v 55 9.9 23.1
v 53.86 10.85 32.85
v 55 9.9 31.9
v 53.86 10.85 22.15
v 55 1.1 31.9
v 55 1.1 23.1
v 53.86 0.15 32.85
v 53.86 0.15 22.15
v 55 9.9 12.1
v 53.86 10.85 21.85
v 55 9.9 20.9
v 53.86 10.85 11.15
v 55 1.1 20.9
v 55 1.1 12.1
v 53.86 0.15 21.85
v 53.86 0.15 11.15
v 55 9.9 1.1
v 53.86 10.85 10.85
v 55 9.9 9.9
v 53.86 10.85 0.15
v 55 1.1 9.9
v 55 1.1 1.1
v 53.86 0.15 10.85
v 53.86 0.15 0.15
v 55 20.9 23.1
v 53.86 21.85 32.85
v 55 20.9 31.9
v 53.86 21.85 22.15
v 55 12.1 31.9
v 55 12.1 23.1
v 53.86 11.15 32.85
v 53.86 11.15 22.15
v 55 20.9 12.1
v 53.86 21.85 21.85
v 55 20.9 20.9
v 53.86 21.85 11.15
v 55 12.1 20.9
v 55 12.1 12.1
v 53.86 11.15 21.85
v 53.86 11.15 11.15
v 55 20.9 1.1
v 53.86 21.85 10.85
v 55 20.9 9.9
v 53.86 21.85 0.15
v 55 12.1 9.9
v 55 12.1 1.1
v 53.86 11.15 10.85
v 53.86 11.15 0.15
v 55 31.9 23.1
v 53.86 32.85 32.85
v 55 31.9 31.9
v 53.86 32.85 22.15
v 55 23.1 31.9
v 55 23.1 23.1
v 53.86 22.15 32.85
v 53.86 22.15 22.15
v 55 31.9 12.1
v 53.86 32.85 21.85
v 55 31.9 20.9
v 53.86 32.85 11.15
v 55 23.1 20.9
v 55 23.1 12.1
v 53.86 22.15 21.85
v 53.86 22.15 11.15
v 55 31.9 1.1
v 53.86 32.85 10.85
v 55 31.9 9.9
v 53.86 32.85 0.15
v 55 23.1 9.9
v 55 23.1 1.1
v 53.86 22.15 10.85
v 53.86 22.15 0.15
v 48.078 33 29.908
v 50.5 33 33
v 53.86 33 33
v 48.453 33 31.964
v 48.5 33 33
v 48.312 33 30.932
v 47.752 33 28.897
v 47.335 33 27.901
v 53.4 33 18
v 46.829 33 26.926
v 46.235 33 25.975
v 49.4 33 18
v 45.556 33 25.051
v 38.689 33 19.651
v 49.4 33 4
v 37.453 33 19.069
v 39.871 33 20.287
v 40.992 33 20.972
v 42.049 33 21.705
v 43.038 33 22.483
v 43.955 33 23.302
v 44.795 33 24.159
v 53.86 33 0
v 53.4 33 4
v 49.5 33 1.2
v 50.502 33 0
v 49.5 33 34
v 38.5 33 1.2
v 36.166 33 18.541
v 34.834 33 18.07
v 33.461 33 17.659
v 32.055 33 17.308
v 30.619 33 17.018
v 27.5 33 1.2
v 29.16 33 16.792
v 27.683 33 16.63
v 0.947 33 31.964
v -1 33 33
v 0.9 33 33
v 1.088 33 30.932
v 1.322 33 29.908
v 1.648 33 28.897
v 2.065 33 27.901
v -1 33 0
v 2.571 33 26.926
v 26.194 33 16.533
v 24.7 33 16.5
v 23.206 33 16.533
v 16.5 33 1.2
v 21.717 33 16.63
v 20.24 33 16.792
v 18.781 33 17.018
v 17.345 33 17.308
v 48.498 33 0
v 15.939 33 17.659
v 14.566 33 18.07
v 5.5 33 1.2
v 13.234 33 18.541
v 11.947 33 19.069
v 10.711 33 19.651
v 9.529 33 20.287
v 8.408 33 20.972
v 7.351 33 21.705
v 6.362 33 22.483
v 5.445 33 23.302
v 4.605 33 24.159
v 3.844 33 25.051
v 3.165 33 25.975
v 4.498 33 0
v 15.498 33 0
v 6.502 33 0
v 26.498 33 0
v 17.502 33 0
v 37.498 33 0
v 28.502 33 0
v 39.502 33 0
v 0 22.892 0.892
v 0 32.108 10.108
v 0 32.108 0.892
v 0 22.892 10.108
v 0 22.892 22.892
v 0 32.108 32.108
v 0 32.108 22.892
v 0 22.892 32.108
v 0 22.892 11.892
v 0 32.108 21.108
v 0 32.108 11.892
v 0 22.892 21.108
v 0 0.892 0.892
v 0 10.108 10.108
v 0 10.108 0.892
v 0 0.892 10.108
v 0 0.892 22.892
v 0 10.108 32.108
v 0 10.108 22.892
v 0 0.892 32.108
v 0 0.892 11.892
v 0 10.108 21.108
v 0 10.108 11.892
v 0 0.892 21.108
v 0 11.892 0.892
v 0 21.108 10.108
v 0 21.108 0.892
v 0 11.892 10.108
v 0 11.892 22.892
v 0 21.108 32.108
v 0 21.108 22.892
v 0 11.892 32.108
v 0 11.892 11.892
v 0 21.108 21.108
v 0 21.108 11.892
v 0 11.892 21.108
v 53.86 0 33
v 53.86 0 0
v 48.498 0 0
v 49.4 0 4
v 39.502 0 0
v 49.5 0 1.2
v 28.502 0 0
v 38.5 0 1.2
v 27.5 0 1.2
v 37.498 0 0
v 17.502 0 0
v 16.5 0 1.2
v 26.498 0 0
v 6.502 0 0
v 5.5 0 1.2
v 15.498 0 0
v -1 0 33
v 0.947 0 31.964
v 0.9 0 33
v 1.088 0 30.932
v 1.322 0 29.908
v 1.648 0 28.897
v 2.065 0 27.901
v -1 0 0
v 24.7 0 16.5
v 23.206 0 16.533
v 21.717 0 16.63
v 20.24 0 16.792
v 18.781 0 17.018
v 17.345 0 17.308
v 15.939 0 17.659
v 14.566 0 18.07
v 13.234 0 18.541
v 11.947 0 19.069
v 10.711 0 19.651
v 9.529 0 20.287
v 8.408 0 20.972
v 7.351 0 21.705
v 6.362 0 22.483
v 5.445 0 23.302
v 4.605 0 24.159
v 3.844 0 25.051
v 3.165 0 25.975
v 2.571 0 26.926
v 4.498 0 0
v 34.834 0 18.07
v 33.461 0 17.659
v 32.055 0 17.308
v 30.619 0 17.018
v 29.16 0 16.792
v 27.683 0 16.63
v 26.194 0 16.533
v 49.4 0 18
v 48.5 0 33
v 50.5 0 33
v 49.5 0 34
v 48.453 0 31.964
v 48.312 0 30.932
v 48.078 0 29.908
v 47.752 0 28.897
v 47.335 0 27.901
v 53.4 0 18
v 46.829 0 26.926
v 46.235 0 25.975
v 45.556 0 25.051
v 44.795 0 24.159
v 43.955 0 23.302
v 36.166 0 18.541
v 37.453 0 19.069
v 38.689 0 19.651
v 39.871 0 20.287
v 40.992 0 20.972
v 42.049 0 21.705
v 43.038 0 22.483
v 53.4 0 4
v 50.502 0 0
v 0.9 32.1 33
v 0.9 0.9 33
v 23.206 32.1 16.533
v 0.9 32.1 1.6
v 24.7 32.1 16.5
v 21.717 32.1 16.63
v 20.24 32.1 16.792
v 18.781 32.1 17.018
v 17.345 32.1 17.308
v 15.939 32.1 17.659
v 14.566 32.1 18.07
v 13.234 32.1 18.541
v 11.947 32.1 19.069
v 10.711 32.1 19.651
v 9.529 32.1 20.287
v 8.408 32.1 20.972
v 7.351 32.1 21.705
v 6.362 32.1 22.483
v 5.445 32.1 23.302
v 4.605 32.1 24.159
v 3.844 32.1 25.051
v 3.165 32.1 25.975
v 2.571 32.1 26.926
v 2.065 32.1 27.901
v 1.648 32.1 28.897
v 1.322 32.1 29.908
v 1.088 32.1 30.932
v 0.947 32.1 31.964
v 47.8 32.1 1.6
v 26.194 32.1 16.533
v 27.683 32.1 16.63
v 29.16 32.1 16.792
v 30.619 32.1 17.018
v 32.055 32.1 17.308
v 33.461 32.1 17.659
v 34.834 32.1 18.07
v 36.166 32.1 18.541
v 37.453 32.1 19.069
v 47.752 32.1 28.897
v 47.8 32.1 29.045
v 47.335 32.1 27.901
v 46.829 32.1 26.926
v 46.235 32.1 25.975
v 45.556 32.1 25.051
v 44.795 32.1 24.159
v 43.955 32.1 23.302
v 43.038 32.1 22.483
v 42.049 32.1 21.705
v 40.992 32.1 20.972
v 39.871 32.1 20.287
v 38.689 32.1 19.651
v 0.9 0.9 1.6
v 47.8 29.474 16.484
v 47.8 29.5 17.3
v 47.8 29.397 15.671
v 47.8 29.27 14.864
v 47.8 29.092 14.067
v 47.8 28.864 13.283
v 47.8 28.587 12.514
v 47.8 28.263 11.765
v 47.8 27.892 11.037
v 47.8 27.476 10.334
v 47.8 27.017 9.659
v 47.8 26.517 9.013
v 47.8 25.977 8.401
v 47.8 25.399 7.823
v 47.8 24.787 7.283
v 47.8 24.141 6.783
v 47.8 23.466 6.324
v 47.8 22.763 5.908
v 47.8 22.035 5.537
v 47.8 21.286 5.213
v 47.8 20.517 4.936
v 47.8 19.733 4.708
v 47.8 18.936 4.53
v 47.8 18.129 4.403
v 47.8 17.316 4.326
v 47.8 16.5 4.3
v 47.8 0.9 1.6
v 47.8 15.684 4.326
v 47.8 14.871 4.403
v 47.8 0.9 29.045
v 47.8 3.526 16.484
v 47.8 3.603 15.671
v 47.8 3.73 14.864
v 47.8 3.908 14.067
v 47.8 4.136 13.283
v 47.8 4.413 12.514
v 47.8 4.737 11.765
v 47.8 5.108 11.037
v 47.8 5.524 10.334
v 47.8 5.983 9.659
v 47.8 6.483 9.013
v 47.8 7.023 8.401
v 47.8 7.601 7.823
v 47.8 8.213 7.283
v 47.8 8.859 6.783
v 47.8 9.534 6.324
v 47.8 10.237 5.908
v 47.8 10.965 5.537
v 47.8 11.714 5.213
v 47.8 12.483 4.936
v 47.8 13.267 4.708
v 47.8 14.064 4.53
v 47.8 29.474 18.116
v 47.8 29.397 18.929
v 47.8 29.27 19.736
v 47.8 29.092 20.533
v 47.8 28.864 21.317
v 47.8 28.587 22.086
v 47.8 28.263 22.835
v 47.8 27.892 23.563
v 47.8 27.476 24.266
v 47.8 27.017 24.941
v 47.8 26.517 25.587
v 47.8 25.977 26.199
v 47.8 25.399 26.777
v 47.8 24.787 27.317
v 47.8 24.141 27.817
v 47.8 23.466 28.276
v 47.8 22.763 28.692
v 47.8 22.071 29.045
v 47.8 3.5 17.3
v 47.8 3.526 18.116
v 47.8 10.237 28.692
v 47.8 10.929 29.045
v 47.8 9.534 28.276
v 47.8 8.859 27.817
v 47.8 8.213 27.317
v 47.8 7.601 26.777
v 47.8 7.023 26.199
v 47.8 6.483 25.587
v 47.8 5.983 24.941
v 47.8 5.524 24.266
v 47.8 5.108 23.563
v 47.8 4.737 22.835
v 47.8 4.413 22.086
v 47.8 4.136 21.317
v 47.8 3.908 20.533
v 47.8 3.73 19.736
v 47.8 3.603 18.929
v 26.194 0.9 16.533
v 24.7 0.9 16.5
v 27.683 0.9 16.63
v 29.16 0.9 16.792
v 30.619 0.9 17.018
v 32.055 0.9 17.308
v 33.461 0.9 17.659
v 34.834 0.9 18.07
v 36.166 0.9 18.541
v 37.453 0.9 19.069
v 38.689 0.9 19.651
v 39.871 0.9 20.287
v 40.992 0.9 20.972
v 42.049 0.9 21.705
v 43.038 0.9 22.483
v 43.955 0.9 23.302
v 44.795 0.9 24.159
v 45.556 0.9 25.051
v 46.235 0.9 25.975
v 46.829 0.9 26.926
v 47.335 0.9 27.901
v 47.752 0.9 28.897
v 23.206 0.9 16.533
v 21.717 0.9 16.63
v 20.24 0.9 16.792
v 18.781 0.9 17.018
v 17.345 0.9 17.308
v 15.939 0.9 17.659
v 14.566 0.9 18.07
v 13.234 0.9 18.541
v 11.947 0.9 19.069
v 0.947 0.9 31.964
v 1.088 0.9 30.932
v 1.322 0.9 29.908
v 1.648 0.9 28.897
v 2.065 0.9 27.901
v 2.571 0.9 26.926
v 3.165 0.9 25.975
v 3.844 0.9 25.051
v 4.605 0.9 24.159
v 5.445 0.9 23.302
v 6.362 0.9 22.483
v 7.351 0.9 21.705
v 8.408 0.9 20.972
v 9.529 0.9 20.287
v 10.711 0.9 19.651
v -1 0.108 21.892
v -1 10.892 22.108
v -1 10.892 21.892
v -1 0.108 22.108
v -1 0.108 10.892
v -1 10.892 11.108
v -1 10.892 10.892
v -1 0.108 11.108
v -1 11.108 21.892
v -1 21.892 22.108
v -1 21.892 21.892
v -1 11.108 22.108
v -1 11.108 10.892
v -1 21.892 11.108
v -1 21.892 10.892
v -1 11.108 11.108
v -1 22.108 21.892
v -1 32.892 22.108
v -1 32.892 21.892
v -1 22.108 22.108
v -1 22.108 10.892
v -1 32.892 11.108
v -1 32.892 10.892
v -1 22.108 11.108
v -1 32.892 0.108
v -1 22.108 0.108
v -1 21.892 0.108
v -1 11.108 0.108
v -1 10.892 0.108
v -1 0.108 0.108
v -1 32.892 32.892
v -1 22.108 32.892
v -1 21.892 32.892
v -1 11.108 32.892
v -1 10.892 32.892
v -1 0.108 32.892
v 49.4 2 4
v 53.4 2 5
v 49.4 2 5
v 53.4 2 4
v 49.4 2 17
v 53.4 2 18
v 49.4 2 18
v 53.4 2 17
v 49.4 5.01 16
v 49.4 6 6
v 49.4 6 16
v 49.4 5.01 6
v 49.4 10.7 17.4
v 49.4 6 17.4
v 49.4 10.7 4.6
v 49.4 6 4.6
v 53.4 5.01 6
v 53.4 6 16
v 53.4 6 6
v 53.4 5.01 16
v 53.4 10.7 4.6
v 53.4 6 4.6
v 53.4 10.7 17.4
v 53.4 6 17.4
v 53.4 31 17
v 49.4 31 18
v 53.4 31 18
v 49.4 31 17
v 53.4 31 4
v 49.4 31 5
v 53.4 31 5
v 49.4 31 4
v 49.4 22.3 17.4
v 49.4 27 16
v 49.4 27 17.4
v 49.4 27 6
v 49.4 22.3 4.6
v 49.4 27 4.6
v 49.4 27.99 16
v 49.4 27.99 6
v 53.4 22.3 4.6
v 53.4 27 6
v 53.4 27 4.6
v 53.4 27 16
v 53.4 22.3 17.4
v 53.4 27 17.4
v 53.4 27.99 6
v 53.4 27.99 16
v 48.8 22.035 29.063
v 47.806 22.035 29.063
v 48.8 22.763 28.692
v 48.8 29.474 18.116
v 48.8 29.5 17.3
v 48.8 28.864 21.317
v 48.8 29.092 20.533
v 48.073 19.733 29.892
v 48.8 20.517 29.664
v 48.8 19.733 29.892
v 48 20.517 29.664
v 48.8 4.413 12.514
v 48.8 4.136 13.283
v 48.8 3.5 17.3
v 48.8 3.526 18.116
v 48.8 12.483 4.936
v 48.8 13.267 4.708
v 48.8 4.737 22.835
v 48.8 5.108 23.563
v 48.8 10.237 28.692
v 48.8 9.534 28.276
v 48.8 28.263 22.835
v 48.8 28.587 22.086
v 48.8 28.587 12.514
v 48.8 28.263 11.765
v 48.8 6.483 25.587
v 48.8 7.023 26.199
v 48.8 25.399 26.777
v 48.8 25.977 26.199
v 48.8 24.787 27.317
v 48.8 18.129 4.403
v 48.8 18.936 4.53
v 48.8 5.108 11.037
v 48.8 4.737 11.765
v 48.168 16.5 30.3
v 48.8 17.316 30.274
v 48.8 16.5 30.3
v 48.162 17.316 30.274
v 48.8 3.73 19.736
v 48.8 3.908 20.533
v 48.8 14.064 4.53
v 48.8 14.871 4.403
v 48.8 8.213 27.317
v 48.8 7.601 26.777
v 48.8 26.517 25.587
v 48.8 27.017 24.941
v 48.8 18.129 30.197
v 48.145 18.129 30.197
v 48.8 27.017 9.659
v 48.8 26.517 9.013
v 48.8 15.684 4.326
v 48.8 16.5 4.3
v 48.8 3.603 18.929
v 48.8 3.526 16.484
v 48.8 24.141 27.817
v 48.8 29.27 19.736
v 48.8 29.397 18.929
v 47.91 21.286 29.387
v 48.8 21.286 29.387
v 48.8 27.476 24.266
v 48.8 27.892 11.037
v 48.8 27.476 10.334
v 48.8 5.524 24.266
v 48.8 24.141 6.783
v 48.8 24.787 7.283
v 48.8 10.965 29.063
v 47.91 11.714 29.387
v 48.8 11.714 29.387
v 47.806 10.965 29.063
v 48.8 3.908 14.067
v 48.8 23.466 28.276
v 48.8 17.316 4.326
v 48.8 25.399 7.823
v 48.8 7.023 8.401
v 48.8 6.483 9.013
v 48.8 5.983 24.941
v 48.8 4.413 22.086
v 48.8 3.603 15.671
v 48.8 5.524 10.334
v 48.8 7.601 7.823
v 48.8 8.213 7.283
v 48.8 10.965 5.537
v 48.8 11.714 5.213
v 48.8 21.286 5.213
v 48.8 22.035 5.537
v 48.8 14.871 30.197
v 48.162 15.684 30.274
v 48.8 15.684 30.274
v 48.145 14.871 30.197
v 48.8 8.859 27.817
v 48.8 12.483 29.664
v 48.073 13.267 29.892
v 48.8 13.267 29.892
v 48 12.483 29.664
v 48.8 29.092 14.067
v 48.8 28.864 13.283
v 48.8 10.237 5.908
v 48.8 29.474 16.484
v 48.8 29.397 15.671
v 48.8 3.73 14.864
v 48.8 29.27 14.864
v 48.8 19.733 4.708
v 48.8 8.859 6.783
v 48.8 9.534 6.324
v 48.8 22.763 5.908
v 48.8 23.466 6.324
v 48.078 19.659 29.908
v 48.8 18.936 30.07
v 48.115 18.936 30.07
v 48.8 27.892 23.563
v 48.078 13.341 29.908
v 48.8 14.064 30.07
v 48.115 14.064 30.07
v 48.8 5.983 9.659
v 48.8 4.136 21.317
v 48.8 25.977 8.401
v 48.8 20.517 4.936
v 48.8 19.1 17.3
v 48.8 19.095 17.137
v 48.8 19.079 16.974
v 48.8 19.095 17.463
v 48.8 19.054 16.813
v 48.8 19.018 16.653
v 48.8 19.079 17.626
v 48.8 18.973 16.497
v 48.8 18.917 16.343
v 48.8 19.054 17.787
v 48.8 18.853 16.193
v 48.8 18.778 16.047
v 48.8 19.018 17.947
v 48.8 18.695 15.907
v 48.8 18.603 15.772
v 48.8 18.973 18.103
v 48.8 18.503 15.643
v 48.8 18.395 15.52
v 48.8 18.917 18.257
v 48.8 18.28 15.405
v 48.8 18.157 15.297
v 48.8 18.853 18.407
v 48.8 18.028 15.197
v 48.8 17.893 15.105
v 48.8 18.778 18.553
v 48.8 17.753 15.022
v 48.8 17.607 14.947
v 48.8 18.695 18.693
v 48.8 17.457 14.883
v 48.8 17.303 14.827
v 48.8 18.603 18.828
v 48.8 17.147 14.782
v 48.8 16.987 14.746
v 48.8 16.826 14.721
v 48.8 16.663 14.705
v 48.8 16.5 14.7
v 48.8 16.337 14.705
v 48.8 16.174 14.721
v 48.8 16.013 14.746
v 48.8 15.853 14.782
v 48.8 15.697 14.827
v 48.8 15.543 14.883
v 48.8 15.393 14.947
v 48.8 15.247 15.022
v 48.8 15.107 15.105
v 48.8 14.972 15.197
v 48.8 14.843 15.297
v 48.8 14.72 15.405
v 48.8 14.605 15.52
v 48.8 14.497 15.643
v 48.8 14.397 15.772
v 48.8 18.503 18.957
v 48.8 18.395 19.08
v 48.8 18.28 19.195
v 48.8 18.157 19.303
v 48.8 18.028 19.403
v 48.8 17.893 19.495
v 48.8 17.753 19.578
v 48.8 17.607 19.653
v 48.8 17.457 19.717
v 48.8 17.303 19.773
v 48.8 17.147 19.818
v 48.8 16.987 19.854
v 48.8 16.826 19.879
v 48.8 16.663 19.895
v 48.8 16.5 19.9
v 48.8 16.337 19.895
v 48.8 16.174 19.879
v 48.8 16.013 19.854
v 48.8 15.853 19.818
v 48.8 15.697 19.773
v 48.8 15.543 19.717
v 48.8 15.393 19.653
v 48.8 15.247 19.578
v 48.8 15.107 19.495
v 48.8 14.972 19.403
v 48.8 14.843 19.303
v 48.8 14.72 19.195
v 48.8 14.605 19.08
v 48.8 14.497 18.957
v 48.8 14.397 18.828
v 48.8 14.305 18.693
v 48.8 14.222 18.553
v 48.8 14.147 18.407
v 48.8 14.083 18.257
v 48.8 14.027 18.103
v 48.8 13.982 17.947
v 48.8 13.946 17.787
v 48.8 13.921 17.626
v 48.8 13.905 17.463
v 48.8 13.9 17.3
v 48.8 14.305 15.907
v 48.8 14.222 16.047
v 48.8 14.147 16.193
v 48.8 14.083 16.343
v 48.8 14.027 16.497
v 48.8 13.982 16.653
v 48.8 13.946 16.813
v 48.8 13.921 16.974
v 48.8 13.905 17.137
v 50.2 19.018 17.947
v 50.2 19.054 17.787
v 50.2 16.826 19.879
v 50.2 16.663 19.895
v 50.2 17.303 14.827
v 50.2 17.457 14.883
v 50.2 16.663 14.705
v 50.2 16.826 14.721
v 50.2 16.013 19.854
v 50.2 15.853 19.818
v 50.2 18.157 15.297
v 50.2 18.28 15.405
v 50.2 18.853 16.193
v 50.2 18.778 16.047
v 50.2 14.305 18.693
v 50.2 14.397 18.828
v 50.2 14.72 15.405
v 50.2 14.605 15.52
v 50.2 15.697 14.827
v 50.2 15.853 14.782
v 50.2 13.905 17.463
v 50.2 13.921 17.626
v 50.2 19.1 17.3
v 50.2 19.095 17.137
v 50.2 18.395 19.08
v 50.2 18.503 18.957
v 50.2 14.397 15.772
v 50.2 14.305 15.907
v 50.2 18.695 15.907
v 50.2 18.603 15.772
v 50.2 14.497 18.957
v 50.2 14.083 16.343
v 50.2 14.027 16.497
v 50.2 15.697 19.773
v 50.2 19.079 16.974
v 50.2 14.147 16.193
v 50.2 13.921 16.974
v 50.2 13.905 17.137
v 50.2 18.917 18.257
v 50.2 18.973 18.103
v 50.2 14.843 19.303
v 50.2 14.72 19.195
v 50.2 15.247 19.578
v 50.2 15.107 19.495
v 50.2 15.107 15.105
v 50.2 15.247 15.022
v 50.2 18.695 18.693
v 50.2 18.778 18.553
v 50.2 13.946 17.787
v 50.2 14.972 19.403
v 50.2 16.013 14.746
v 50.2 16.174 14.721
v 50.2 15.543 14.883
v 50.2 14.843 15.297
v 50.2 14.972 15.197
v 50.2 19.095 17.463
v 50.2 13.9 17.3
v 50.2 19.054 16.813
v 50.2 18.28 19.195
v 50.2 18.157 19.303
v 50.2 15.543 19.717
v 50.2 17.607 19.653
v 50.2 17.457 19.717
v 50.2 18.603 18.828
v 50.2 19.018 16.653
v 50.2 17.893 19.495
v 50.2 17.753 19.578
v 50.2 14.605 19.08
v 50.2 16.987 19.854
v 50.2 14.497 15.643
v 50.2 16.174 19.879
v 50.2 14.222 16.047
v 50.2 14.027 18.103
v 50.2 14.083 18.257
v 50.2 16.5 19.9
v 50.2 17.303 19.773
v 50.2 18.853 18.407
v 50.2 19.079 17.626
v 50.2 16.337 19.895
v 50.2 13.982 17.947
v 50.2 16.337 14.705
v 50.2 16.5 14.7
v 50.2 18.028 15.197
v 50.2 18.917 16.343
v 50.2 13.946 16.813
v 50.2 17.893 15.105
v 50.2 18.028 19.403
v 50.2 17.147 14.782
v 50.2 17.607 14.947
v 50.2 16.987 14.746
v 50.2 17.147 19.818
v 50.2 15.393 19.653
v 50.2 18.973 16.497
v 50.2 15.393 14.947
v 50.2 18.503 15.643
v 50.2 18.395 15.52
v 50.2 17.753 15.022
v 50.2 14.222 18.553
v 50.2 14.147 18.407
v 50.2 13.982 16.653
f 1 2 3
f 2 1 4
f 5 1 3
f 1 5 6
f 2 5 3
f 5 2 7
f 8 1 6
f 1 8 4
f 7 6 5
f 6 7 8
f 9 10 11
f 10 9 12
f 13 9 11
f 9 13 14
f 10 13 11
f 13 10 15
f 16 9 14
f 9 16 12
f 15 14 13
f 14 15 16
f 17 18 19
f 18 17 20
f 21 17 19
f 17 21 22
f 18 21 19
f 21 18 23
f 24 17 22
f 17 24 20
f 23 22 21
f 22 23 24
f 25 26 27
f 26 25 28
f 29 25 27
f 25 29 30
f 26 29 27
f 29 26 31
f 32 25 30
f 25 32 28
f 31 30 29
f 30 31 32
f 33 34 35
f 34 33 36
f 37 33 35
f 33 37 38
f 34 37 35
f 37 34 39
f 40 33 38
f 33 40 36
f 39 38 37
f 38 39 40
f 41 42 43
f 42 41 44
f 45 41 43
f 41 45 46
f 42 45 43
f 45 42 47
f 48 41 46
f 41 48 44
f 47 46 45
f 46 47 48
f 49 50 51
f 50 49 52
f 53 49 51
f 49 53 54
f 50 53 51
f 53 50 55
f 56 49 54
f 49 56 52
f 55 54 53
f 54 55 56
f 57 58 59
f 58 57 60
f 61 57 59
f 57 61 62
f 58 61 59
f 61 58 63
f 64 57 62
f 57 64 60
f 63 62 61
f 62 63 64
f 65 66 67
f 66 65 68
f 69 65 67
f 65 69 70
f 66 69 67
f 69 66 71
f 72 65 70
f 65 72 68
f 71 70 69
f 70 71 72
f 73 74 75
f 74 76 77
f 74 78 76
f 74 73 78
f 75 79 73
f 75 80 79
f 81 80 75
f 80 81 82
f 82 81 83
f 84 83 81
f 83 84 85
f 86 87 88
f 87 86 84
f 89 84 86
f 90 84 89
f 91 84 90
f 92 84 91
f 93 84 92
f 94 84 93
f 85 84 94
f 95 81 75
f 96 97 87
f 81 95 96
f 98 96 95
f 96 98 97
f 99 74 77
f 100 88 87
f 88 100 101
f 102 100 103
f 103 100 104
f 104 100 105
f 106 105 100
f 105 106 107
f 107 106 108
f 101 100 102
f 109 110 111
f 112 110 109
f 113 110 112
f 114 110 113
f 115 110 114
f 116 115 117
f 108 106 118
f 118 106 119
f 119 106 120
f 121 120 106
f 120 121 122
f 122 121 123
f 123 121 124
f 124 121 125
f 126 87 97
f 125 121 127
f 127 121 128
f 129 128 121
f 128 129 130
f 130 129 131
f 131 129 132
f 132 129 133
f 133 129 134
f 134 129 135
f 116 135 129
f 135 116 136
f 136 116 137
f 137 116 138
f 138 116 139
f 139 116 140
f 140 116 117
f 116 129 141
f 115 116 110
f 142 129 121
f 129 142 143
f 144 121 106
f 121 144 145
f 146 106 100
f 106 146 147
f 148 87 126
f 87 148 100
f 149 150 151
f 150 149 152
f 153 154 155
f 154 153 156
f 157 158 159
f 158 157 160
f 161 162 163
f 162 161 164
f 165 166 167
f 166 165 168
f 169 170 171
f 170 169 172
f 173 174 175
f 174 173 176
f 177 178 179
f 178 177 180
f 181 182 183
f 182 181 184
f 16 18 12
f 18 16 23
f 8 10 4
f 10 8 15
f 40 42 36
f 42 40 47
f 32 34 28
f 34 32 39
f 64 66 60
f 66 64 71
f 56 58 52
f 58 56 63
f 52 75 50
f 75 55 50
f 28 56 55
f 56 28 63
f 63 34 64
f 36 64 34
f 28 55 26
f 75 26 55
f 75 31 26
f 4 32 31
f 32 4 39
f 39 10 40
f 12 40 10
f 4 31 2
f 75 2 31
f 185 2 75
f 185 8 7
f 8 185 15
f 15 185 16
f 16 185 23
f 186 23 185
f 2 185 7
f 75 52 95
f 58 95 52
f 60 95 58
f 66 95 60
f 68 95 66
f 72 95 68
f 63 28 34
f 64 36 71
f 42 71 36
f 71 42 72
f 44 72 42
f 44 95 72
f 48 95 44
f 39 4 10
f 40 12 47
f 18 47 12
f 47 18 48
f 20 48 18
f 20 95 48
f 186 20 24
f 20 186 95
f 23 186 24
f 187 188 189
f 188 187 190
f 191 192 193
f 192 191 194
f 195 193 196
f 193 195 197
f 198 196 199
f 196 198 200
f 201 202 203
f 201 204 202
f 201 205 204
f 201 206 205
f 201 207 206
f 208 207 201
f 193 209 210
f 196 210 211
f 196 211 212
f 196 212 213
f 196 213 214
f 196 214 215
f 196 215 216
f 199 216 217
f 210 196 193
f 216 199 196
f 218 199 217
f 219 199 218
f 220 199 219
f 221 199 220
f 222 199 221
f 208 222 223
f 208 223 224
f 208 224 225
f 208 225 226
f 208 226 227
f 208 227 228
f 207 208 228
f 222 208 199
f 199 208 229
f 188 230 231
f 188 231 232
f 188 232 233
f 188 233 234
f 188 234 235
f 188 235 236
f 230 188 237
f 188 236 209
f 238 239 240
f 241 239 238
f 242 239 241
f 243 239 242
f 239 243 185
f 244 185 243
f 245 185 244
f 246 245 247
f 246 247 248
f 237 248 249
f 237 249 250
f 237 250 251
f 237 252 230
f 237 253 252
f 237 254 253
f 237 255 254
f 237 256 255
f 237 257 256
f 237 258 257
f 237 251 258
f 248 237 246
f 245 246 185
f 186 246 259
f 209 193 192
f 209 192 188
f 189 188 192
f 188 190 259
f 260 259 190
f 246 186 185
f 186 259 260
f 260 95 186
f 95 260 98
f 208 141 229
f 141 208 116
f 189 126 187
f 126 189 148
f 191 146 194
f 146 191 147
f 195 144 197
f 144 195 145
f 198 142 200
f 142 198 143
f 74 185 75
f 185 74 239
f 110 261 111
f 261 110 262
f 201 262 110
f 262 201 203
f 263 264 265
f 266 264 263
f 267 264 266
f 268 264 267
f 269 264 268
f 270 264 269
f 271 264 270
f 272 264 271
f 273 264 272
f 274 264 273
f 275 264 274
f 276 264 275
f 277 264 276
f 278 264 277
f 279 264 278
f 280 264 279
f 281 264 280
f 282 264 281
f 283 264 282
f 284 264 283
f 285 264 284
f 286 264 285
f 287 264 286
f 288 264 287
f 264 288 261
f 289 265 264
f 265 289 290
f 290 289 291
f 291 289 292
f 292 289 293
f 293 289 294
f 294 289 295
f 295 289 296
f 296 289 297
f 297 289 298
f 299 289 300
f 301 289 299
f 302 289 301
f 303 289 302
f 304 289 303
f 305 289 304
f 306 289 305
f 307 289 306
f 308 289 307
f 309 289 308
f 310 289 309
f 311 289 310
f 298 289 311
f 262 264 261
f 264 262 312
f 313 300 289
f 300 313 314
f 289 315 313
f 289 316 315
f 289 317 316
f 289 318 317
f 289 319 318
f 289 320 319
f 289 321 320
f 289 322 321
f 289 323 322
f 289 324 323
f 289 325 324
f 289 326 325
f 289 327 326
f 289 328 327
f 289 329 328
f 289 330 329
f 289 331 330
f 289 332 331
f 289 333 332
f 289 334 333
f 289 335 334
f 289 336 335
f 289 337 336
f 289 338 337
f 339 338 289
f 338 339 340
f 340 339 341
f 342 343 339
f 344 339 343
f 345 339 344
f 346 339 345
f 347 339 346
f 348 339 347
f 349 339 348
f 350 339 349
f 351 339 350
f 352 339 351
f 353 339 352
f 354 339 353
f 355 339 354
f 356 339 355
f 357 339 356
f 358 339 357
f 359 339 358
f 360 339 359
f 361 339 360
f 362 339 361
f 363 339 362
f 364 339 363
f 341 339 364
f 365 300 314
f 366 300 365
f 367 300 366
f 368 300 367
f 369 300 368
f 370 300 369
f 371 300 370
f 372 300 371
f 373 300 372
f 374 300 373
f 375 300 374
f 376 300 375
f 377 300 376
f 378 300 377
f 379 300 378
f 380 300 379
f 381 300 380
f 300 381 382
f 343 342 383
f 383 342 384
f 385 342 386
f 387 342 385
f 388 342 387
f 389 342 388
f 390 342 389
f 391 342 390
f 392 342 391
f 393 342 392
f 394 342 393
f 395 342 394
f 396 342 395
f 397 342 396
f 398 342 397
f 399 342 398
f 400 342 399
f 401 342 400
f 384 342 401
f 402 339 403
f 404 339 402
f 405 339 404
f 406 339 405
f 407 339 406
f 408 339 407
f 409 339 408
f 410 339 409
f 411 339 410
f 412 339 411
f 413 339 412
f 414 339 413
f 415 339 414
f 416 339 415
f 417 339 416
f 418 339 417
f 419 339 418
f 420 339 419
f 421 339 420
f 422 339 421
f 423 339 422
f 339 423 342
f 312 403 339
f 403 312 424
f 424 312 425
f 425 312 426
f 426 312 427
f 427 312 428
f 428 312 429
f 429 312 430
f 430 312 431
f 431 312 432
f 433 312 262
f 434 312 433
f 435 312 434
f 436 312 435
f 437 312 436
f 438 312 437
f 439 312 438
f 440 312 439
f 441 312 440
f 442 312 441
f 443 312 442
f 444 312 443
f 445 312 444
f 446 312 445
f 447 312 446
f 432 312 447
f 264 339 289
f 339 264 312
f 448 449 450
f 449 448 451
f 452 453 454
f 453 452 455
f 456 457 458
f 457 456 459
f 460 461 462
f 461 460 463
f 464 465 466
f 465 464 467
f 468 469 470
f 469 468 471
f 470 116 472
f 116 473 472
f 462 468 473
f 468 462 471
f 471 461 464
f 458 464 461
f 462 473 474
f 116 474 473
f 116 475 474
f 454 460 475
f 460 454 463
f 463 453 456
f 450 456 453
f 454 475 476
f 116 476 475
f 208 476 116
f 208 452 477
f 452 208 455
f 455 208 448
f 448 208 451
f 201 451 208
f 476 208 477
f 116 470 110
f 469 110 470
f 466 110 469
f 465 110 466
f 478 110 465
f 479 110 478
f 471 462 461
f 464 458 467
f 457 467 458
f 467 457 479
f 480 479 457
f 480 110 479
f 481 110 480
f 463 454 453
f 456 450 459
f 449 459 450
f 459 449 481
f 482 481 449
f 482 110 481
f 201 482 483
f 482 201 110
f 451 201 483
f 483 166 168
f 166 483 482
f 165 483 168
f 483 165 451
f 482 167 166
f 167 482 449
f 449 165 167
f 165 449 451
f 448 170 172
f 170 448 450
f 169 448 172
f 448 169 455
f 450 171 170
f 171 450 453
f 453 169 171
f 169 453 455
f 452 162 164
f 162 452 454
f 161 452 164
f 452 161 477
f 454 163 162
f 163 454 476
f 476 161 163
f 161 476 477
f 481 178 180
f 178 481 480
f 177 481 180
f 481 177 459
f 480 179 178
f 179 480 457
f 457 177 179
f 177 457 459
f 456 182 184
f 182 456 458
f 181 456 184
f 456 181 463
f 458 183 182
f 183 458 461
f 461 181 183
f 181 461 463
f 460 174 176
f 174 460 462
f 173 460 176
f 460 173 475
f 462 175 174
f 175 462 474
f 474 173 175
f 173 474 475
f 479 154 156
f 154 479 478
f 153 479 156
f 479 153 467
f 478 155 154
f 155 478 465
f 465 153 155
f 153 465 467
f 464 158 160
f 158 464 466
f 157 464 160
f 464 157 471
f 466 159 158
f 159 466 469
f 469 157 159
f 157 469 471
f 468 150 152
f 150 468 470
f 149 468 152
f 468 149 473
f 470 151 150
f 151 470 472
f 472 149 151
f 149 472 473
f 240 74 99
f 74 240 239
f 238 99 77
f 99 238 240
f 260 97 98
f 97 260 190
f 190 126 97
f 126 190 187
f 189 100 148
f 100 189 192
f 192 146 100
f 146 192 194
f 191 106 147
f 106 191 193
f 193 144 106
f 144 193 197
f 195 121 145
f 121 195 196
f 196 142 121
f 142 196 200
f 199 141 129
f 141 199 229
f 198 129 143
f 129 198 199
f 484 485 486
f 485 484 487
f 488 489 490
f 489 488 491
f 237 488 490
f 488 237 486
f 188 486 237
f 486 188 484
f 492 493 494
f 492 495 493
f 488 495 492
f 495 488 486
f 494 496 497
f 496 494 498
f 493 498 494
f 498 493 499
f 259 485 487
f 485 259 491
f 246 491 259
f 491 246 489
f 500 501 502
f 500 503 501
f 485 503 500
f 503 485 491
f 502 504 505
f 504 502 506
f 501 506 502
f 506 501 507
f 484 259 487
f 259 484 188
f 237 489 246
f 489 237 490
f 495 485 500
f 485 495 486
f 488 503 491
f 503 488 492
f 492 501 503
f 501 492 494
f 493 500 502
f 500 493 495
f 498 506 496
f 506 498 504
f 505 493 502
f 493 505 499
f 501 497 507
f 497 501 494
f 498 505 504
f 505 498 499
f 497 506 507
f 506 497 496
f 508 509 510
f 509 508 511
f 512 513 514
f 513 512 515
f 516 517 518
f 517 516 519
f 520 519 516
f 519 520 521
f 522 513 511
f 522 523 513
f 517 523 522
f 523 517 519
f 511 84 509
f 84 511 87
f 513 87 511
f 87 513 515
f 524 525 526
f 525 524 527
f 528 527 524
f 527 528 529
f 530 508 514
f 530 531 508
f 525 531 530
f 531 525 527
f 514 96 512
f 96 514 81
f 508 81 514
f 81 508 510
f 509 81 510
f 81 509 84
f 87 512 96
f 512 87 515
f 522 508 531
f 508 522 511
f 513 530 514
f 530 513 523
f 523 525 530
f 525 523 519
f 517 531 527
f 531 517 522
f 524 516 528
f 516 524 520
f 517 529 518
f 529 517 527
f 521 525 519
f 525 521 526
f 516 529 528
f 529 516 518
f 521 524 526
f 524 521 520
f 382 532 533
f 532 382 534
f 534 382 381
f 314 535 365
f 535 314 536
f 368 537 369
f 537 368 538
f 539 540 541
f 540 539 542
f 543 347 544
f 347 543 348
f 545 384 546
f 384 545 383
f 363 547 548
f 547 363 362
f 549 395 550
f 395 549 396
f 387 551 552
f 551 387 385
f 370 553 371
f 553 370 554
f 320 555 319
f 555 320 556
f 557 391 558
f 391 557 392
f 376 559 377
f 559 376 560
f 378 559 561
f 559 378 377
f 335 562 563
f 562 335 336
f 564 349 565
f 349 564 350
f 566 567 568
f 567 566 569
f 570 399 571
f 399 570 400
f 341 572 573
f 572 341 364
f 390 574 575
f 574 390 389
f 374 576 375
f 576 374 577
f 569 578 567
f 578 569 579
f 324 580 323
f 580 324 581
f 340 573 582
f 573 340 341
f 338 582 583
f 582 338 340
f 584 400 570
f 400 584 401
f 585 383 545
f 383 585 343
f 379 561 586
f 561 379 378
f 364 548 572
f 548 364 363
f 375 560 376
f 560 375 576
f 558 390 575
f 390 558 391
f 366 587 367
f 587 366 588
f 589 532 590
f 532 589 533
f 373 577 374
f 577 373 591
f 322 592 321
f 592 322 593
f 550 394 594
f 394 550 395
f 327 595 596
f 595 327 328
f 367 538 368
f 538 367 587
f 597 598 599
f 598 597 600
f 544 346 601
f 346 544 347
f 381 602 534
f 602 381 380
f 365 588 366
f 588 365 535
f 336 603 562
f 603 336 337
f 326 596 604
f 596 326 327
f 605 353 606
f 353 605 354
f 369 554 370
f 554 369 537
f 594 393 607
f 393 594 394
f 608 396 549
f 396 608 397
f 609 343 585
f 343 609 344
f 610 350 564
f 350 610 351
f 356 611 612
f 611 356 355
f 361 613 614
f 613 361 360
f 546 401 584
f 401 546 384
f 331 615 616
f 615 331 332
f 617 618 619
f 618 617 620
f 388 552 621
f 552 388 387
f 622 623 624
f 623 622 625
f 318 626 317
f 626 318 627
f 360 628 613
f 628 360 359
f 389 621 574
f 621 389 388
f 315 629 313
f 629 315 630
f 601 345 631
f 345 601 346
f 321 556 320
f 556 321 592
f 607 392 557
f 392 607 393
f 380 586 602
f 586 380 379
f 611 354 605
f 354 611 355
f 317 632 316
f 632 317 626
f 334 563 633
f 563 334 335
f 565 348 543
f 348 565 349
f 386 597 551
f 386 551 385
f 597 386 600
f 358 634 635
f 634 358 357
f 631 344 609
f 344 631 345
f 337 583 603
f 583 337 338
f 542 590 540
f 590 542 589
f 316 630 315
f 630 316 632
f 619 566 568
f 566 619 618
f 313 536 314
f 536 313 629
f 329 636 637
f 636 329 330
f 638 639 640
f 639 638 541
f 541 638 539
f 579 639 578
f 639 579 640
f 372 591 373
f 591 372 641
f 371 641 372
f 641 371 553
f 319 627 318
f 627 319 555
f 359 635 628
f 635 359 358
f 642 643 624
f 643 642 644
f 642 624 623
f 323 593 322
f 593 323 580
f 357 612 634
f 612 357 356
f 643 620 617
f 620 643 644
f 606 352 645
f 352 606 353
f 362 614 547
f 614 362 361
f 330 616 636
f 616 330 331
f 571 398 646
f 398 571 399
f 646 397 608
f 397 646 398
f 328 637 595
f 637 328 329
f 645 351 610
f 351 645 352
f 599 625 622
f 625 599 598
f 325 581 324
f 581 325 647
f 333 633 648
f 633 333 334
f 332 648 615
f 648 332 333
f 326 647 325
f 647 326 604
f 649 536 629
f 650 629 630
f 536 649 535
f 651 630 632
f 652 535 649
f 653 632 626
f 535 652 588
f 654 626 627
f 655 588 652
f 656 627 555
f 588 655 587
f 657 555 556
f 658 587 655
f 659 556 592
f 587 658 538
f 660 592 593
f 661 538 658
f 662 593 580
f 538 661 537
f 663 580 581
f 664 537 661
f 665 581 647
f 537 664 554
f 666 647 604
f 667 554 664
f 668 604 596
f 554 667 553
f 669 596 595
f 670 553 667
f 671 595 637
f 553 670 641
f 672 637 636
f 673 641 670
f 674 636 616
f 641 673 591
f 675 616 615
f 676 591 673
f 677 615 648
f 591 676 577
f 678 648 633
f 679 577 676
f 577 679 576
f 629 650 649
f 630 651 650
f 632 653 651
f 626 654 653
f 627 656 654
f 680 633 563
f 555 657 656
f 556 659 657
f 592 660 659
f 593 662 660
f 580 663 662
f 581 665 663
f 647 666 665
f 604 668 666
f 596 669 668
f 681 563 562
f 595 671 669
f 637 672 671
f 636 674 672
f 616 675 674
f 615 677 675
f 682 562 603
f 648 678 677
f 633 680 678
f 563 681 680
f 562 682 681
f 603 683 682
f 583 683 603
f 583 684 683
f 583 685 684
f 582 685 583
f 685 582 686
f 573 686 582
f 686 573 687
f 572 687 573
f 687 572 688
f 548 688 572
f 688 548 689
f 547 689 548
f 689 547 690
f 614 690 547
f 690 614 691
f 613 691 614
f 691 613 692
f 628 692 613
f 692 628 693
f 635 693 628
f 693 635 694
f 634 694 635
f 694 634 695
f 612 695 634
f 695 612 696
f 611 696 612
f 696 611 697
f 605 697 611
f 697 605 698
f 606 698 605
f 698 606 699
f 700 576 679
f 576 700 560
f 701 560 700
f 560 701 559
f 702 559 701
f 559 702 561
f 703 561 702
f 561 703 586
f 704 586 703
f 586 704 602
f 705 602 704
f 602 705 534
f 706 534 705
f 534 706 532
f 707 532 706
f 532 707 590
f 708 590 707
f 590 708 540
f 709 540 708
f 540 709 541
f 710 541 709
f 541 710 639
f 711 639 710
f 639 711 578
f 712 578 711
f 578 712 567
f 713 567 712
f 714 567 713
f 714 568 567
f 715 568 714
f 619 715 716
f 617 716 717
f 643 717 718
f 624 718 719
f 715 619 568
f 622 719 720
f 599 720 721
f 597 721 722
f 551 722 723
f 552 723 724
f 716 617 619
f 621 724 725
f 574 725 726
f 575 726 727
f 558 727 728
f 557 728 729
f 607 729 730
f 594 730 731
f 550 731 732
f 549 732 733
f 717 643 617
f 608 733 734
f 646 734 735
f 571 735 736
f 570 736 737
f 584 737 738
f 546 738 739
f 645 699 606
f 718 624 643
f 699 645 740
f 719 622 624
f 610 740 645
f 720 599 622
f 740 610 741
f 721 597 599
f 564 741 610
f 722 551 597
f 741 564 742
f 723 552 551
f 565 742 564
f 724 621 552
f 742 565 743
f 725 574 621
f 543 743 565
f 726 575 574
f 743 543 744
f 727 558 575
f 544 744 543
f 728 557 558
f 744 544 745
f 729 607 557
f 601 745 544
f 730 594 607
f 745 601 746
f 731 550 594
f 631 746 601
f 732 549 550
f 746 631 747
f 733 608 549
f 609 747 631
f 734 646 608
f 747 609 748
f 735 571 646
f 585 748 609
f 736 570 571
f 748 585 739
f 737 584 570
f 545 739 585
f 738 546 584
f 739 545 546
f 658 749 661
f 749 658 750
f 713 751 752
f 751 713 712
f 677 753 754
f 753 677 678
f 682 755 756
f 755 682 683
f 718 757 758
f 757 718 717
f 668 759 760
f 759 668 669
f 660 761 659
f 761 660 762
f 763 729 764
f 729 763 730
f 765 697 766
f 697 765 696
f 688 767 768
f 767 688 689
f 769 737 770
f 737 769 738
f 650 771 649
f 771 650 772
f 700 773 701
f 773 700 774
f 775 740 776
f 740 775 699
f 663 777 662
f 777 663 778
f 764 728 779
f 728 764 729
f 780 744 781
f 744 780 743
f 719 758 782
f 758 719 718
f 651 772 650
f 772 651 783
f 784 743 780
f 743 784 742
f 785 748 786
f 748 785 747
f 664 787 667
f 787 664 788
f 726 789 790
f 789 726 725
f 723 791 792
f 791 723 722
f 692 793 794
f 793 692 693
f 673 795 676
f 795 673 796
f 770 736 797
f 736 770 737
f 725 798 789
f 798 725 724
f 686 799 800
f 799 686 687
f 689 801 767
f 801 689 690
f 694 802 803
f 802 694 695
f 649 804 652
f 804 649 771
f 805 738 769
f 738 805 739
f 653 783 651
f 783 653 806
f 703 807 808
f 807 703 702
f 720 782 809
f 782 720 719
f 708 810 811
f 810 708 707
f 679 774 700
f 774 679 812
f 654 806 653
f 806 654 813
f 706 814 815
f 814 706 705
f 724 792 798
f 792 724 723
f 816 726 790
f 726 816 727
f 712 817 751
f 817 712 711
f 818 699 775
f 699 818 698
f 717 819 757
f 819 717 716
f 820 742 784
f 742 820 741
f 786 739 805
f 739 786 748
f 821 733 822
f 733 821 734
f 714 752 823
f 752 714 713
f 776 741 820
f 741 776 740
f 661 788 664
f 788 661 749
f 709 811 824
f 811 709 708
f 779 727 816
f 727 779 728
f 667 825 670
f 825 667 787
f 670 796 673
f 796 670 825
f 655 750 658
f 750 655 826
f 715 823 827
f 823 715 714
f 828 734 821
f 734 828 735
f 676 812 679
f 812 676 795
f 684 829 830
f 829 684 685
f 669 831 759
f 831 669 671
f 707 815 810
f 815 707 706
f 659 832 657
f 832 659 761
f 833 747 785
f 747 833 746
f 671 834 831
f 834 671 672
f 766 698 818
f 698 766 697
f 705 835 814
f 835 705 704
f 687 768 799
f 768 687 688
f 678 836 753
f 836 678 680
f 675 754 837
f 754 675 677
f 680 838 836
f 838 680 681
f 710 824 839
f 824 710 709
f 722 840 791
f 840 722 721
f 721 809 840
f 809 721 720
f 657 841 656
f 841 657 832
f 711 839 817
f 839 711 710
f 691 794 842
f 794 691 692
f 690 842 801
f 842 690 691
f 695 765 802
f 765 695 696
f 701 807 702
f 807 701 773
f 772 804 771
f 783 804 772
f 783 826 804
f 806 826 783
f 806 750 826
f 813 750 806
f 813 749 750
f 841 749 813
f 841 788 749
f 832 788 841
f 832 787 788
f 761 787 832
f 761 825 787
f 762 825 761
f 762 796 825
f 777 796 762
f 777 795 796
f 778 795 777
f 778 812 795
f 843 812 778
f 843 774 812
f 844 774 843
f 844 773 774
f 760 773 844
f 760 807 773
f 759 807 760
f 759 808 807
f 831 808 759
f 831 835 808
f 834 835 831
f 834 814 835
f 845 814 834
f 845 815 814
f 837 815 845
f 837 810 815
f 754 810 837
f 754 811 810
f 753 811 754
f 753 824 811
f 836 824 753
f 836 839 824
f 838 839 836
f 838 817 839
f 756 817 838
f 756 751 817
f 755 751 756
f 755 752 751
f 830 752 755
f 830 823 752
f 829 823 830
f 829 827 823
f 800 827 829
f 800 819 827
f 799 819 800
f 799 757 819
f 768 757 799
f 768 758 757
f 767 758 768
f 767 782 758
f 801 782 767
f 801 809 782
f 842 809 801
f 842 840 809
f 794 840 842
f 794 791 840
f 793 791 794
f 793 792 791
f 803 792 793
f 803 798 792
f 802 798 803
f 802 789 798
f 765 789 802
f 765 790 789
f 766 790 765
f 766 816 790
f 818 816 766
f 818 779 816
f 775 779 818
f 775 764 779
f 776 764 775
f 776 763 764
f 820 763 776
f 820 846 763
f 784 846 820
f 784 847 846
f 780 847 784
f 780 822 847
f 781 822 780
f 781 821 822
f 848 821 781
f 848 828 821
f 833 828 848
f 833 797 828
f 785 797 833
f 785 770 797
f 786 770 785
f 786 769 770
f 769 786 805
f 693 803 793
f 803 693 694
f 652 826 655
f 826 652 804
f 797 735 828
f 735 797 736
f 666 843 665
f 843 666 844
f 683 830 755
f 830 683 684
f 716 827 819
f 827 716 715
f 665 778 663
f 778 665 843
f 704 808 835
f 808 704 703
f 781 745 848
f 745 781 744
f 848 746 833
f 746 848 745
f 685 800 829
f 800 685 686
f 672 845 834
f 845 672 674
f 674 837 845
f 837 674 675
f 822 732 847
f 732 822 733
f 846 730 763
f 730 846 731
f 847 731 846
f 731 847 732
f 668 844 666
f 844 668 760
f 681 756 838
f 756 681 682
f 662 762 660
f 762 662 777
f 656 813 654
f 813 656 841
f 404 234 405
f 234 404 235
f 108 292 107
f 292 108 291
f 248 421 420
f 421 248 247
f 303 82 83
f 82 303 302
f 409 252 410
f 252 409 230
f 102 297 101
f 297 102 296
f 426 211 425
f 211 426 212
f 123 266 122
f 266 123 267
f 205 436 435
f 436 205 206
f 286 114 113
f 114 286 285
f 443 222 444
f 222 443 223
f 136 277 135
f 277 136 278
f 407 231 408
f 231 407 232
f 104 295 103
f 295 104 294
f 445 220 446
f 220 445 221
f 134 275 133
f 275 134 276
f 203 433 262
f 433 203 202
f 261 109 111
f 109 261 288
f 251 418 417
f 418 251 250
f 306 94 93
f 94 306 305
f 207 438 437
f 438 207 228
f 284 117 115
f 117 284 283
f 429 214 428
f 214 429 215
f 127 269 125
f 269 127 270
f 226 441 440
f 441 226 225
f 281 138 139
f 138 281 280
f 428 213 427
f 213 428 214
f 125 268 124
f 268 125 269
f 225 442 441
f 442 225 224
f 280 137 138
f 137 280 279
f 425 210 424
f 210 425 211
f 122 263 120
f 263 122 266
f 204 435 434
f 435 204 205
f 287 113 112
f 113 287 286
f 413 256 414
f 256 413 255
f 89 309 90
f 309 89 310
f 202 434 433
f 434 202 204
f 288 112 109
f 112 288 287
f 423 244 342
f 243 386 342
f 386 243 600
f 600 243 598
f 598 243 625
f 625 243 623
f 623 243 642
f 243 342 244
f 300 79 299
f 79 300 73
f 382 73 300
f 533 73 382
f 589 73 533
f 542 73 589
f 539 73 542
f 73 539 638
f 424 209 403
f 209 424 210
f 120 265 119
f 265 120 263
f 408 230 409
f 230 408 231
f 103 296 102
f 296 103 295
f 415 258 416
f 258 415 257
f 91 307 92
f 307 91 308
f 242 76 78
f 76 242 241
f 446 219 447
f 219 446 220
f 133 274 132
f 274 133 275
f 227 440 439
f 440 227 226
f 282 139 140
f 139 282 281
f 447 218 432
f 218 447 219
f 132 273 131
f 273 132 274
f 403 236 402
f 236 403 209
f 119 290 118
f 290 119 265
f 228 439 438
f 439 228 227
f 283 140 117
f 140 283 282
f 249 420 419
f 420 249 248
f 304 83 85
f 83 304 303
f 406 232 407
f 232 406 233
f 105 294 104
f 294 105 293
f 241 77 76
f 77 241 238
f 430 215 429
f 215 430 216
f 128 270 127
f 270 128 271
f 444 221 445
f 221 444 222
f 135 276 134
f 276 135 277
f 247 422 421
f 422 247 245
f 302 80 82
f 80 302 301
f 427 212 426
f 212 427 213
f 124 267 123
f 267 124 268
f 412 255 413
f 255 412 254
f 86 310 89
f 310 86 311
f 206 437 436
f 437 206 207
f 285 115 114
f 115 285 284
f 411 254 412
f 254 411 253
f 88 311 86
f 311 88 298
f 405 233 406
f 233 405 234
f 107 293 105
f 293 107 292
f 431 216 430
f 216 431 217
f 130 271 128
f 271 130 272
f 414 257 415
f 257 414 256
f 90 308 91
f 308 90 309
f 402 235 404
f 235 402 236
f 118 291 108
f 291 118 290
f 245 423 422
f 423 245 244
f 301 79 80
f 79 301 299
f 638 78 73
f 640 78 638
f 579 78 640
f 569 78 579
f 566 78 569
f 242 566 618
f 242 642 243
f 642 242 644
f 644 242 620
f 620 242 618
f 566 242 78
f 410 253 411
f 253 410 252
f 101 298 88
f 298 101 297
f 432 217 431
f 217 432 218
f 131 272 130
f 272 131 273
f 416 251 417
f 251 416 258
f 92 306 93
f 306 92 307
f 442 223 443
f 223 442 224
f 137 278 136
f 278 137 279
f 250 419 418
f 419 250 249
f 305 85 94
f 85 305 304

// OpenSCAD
/*
 * MiniBox v1.x
 */

/* [Box Configuration] */
// Overall type regarding side and front walls
Box_Type = "open_concave"; //["open_concave":Open box with concave cut side-walls, "open_solid":Open box with solid side-walls, "closable-box-and-door":Closable box with slide-in front wall, "closable-box":Closable box - for slide-in front wall, "3d-door":Slide-in front wall for closable box, "2d-door":2D projection of door only - for laser cuts]
// Cut out OpenLOCK connector bays?
Openlock_Support = "yes"; //["yes":Yes - cut out OpenLOCK connector bays, "no":No]

/* [Miniature Configuration] */
// How many minis shall be stored?
Number_of_Minis = 1; //[1:8]

// Diameter of mini's base
Mini_Base_Size = 25.25; //[16.37:small - 16.37 mm, 25.25:medium - 25.25 mm, 50.5:large - 50.5 mm, 75.75:huge - 75.75 mm, 101.0:gargantuan - 101 mm]

// Total width of mini (only when larger than base size)
Mini_Width = 0.01; //[::float]
// Total depth of mini (only when larger than base size)
Mini_Depth = 0.01;   //[::float]
// Total height of mini including base (in mm)
Mini_Height = 38.01;   //[::float]

// How is the left and right overhang of the mini distributed?
Left_Right_Overhang_Mode = "even"; //["even":Same overhang on both sides, "only_left":Overhang on left side only, "only_right":Overhang on right side only]
// Fixed left side overhang (in mm)
Left_Overhang_Override = 0.01; //[::float]
// Fixed right side overhang (in mm)
Right_Overhang_Override = 0.01; //[::float]

// How is the front and back overhang of the mini distributed?
Front_Back_Overhang_Mode = "even"; //["even":Same overhang on both sides, "only_front":Overhang on front side only, "only_back":Overhang on back side only]
// Fixed front side overhang (in mm)
Front_Overhang_Override = 0.01; //[::float]
// Fixed back side overhang (in mm)
Back_Overhang_Override = 0.01; //[::float]

/* [Box Size Override] */
// Minimal width of box (measured in grid fields)
Box_Width_Override = 2; //[2:18]
// Minimal depth of box (measured in grid fields)
Box_Depth_Override = 2; //[2:8]
// Minimal height of box (measured in grid fields)
Box_Height_Override = 3; //[2:12]

/* [Magnet Configuration] */
// Cut out cylinder magnet hole?
Magnet_Support = "yes"; //["yes":Yes - cut out hole for magnet, "no":No]
// 5.2 mm works fine for 5x1 mm cylinder magnets
Magnet_Diameter = 5.2;
// 1.4 mm works fine for 5x1 mm cylinder magnets
magnet_height = 1.4;

/* [Expert Settings] */
// Size of one square grid field (11.0 mm recommended)
Grid_Size = 11;
// Thickness of side walls (in mm)
Side_Wall_Thickness = 0.9;
// Thickness of back wall (in mm)
Back_Wall_Thickness = 1.6;
// Thickness of box ceiling (in mm)
Ceiling_Thickness = 0.9;
// Thickness of box floor (in mm)
Floor_Thickness = 7.2;
// Depth of mini base cut out (in mm)
Mini_Base_Cut_Out_Depth=1.0;
// Height of mini base (in mm)
Mini_Base_Height=2.5;

/* [Padding and Buffering] */
// Additional space on left side of miniature 
padding_x_left = 0.2;
// Additional space on right side of miniature 
padding_x_right = 0.2;
// Additional space in front of miniature 
padding_y_front = 0.2;
// Additional space behind miniature 
padding_y_back = 0.2;
// Additional space above miniature 
padding_z = 1.2;
// Additional space on very left side of box 
buffer_left = 0.1;
// Additional space on very right side of box 
buffer_right = 0.1;
// Addition to base cutout diameter  (in mm)
base_cutout_padding = 0.75;
// Shrinkage of slide-in wall 
front_wall_buffer = 0.5;

/* [Rail Settings] */
// Offset of the rail from the front edge
rail_offset = 1.01;
// Width of the rail inside (must be less than rail_width_outer)
rail_width_inner = 0.51;
// Width of the rail at the opening
rail_width_outer = 1.01;
// Depth of the rail
rail_depth = 1.01;

/* [Hidden] */

draw_box = (Box_Type == "open_concave") || (Box_Type == "open_solid") || (Box_Type == "closable-box-and-door") || (Box_Type == "closable-box");
draw_3d_door = (Box_Type == "closable-box-and-door") || (Box_Type == "3d-door");
draw_2d_door = (Box_Type == "2d-door");
is_closable_box = (Box_Type == "closable-box-and-door") || (Box_Type == "closable-box");
is_concave_sides = (Box_Type == "open_concave");
is_openlock = (Openlock_Support == "yes");
is_magnet = (Magnet_Support == "yes");

// because of the upper rail we have to increase the z padding for the mini to pass through the opening:
padding_z_effective = padding_z + (is_closable_box ? rail_depth : 0);
ceiling_edge_thickness = Ceiling_Thickness + (is_closable_box ? rail_depth : 0);

front_wall_thickness = is_closable_box
                        ? rail_offset + max(rail_width_inner, rail_width_outer)
                        : 0;

mini_x = max(Mini_Width, Left_Overhang_Override + Mini_Base_Size + Right_Overhang_Override);
mini_y = max(Mini_Depth, Front_Overhang_Override + Mini_Base_Size + Back_Overhang_Override);
mini_z = Mini_Height;

total_width_overhang = mini_x - Mini_Base_Size;
distr_width_overhang = total_width_overhang - Left_Overhang_Override - Right_Overhang_Override;
overhang_left  = Left_Right_Overhang_Mode == "only_left"  ? Left_Overhang_Override + distr_width_overhang :
                 Left_Right_Overhang_Mode == "only_right" ? Left_Overhang_Override :
                                                            Left_Overhang_Override + distr_width_overhang / 2;
overhang_right = Left_Right_Overhang_Mode == "only_left"  ? Right_Overhang_Override :
                 Left_Right_Overhang_Mode == "only_right" ? Right_Overhang_Override + distr_width_overhang :
                                                            Right_Overhang_Override + distr_width_overhang / 2;
total_depth_overhang = mini_y - Mini_Base_Size;
distr_depth_overhang = total_depth_overhang - Front_Overhang_Override - Back_Overhang_Override;
overhang_front = Front_Back_Overhang_Mode == "only_front" ? Front_Overhang_Override + distr_depth_overhang :
                 Front_Back_Overhang_Mode == "only_back"  ? Front_Overhang_Override :
                                                            Front_Overhang_Override + distr_depth_overhang / 2;
overhang_back  = Front_Back_Overhang_Mode == "only_front" ? Back_Overhang_Override :
                 Front_Back_Overhang_Mode == "only_back"  ? Back_Overhang_Override + distr_depth_overhang :
                                                            Back_Overhang_Override + distr_depth_overhang / 2;
echo(
    str("Actual Overhangs: ",
        "Left=", overhang_left,
        ", Right=", overhang_right,
        ", Front=", overhang_front,
        ", Back=", overhang_back
));
                    
padded_mini_x = padding_x_left + mini_x + padding_x_right;
padded_mini_y = padding_y_front + mini_y + padding_y_back;
padded_mini_z = mini_z + padding_z_effective;

minimal_openlock_buffer_left = 11.1 - Side_Wall_Thickness - padding_x_left - overhang_left - ((Mini_Base_Size + base_cutout_padding) / 2 - Magnet_Diameter / 2);
minimal_openlock_buffer_right = 11.1 - Side_Wall_Thickness - padding_x_right - overhang_right - ((Mini_Base_Size + base_cutout_padding) / 2 - Magnet_Diameter / 2);
eff_buffer_left = max(buffer_left, is_openlock && is_magnet ? minimal_openlock_buffer_left : 0);
eff_buffer_right = max(buffer_right, is_openlock && is_magnet ? minimal_openlock_buffer_right : 0);
echo(
    str("Effective side buffers: ",
        "Left=", eff_buffer_left,
        ", Right=", eff_buffer_right
));

x = max(ceil((Side_Wall_Thickness + eff_buffer_left + padded_mini_x * Number_of_Minis + eff_buffer_right + Side_Wall_Thickness) / Grid_Size), Box_Width_Override);
y = max(ceil((front_wall_thickness + padded_mini_y + Back_Wall_Thickness) / Grid_Size), Box_Depth_Override);
z = max(ceil((Floor_Thickness + padded_mini_z + Ceiling_Thickness) / Grid_Size), Box_Height_Override);

x_space_per_mini = (Grid_Size*x - 2 * Side_Wall_Thickness- eff_buffer_left - eff_buffer_right) / Number_of_Minis;
y_space_per_mini = Grid_Size*y - front_wall_thickness - Back_Wall_Thickness;
z_space_per_mini = Grid_Size*z - Floor_Thickness - ceiling_edge_thickness;

eff_mini_x = x_space_per_mini - padding_x_left - padding_x_right;
eff_mini_y = y_space_per_mini - padding_y_front - padding_y_back;
eff_mini_z = z_space_per_mini - padding_z_effective;

eff_overhang_left = overhang_left + (eff_mini_x - mini_x) / 2;
eff_overhang_right = overhang_right + (eff_mini_x - mini_x) / 2;

eff_overhang_front = overhang_front + (eff_mini_y - mini_y) / 2;
eff_overhang_back = overhang_back + (eff_mini_y - mini_y) / 2;

echo(
    str("Input miniature dimensions: ",
        mini_x, " x ",
        mini_y, " x ",
        mini_z, " mm"
));

echo(
    str("Effective overhangs: ",
        "Left=", eff_overhang_left,
        ", Right=", eff_overhang_right,
        ", Front=", eff_overhang_front,
        ", Back=", eff_overhang_back
));

/*
 * Openlock connection bay
 */
module openlock_negative() {
  height = 4;
  zPos = 1.6;
  buffer=1;
  union() {  
    translate([-buffer,-7,zPos]) cube([2+buffer,7*2,height]);
    hull() {
      translate([0,-6,zPos]) cube([2,6*2,height]);
      translate([3+0.01,-5,zPos]) cube([2,5*2,height]);
    }
    hull() {
      translate([5,-5,zPos]) cube([1,5*2,height]);
      translate([6,-5,zPos]) cube([1,5*2,height]);
    }
    translate([6,-6.4,zPos]) cube([4.7,6.4*2,height]);
  }
}

module openlock_negatives() {
    for( i= [y-1 : -2 : 1]) {
        translate([0, i*Grid_Size, 0]) rotate([0,0,0]) openlock_negative();
        translate([x*Grid_Size, i*Grid_Size, 0]) rotate([0,0,180]) openlock_negative();
    }
}


module bottom_square() {
  hull() {
    translate([0.1,0.1,1.2]) cube([Grid_Size-0.2,Grid_Size-0.2,0.01]);
    translate([1.1,1.1,0]) cube([Grid_Size-2.2,Grid_Size-2.2,0.01]);
  }
}

module bottom_squares() {
    for ( i = [0 : x-1] ) {
        for ( j = [0 : y-1] ) {
            translate([i*Grid_Size, j*Grid_Size, 0])
            bottom_square();
        }
    }
}

module top_square() {
    difference() {
        cube([Grid_Size, Grid_Size, 1]);
        hull() {
            translate([0.9,0.9,-0.01])
             cube([Grid_Size-1.8, Grid_Size-1.8, 0.01]);
            translate([0.1,0.1,1.01])
             cube([Grid_Size-0.2, Grid_Size-0.2, 0.01]);
        }
    }
}

module top_squares() {
    for ( i = [0 : x-1] ) {
        for ( j = [0 : y-1] ) {
            translate([i*Grid_Size, j*Grid_Size, z*Grid_Size])
            top_square();
        }
    }
}

module main_cube() {
    render_buffer = 0.06;
    difference() {
      translate([0,0,1.2-render_buffer])
        cube([x*Grid_Size,y*Grid_Size,z*Grid_Size-1.2+render_buffer]);
      translate([Side_Wall_Thickness, -0.01, Floor_Thickness])
        cube([x*Grid_Size-2*Side_Wall_Thickness, y*Grid_Size-Back_Wall_Thickness+0.01,
              z*Grid_Size-Floor_Thickness-Ceiling_Thickness]);
    }
}

module front_bar() {
    zPos = Grid_Size/2;
    translate([0,0,zPos])
    rotate([0,90,0])
    linear_extrude(height = x*Grid_Size)
    polygon(points=[[-1,0],[1,0],[0,-1]]);
}

module rails_bottom_rail_negative() {
    
    translate([-0.1, rail_offset, Floor_Thickness - rail_depth])
    hull() {
        translate([0, rail_width_outer - rail_width_inner, 0])
          cube([x*Grid_Size +0.2, rail_width_inner, 0.01]);
        
        translate([0, 0, rail_depth])
          cube([x*Grid_Size +0.2, rail_width_outer, 0.01]);
    }

}

module rails_sidewall_cuts() {
    // side wall cut
    h = z*Grid_Size - Floor_Thickness - Ceiling_Thickness;
    translate([0 -0.1, -0.1, Floor_Thickness])
      cube([x*Grid_Size +0.2, rail_offset + rail_width_outer + 0.1, h]);
}

module frontCeiling_Thickness_rails() {
    // back 
    translate([0, rail_offset + rail_width_outer, z*Grid_Size - Ceiling_Thickness - rail_depth])
    hull() {
      cube([x*Grid_Size, 0.1, 0.1]);
      translate([0,0,rail_depth])
        cube([x*Grid_Size, 2*rail_offset, 0.1]);
    }
    // front 
    translate([0, 0, z*Grid_Size - Ceiling_Thickness - rail_depth])
    hull() {
      translate([0, 0, 0])
        cube([x*Grid_Size, rail_offset, 0.1]);
      translate([0, 0, rail_depth])
        cube([x*Grid_Size, rail_offset + (rail_width_outer - rail_width_inner), 0.1]);
    }
}

module main_positive() {
    union() {
        bottom_squares();
        main_cube();
        front_bar();
        top_squares();
    }
}

module back_grooves() {
    for ( i = [0 : z-1] ) {
        translate([-0.01, y*Grid_Size, Grid_Size/2 + i*Grid_Size])
        rotate([0,90,0])
        linear_extrude(height = x*Grid_Size + 0.02)
        polygon(points=[[-1.01,0.01],[1.01,0.01],[0,-1.2]]);
    }
}

module round_sidewall_cuts() {
    zPos = (Grid_Size/2+1);
    h = z*Grid_Size - zPos - Ceiling_Thickness;
    translate([-0.01, 0, h/2 + zPos])
    rotate([0,90,0])
    linear_extrude(height = x*Grid_Size + 0.02)
    resize([h, y*Grid_Size]) circle(d=1,$fn=100);
}

module figure_base_cutout() {
  translate([0,0,Floor_Thickness - Mini_Base_Cut_Out_Depth])
    linear_extrude(Mini_Base_Height + Mini_Base_Cut_Out_Depth)
    circle(d=Mini_Base_Size + base_cutout_padding, $fn=100);
  
  if (is_magnet) {
    translate([0,0,Floor_Thickness - Mini_Base_Cut_Out_Depth - magnet_height])
      linear_extrude(magnet_height + 0.01)
      circle(d=Magnet_Diameter, $fn=100);
  }
}

module figure_base_cutouts() {
    for ( i = [0 : Number_of_Minis-1] ) {
        translate([Side_Wall_Thickness + eff_buffer_left + padding_x_left + eff_overhang_left + Mini_Base_Size / 2 + x_space_per_mini * i,
      front_wall_thickness + padding_y_front + eff_overhang_front + Mini_Base_Size / 2, 0])
        figure_base_cutout();
    }
}

module box() {
    union() {
        difference() {
            main_positive();
            
            back_grooves();
            
            if (is_openlock) {
              openlock_negatives();
            }
            
            figure_base_cutouts();
            
            if (is_concave_sides) {
                round_sidewall_cuts();
            } else if (is_closable_box) {
                rails_sidewall_cuts();
                rails_bottom_rail_negative();
            }
        }
        
        if (is_closable_box) {
            frontCeiling_Thickness_rails();
        }
    }
}

module slide_in_front_wall() {
    h = z*Grid_Size - Ceiling_Thickness - Floor_Thickness + rail_depth - front_wall_buffer;
    
    translate([0, -(rail_width_outer - rail_width_inner),0])
    union() {
        hull() {
            translate([0, 0, rail_depth])
              cube([x*Grid_Size, rail_width_inner, h - 2*rail_depth]);

            translate([0, rail_width_outer - rail_width_inner, 0])
              cube([x*Grid_Size, rail_width_inner, h]);
        }
        
        //handles
        translate([0, -(rail_offset - front_wall_buffer/2), rail_depth])
          cube([Side_Wall_Thickness, rail_offset, h - 2*rail_depth]);
        translate([x*Grid_Size-Side_Wall_Thickness, -(rail_offset - front_wall_buffer/2), rail_depth])
          cube([Side_Wall_Thickness, rail_offset, h - 2*rail_depth]);
    }
}

module slide_in_front_wall_2d() {
    h = z*Grid_Size - Ceiling_Thickness - Floor_Thickness + rail_depth - front_wall_buffer;
    cube([x*Grid_Size, 1, h]);
}

if (draw_box) {
  translate([z*Grid_Size, 0, y*Grid_Size])
  rotate([-90,0,90])
    box();
}

if (draw_3d_door) {
  translate([z*Grid_Size - Floor_Thickness, -x*Grid_Size-10, rail_width_inner])
  rotate([-90,0,90])
    slide_in_front_wall();
}

if (draw_2d_door) {
  projection()
    rotate([-90,0,90])
    slide_in_front_wall_2d();
}

echo(
    str("Box grid size: ",
        x, " x ",
        y, " x ",
        z
));

echo(
    str("Box outside dimension: ",
        Grid_Size*x, " x ",
        Grid_Size*y, " x ",
        Grid_Size*z, " mm"
));

echo(
    str("Maximum single miniature dimension: ",
        x_space_per_mini, " x ",
        y_space_per_mini, " x ",
        z_space_per_mini, " mm"
));
